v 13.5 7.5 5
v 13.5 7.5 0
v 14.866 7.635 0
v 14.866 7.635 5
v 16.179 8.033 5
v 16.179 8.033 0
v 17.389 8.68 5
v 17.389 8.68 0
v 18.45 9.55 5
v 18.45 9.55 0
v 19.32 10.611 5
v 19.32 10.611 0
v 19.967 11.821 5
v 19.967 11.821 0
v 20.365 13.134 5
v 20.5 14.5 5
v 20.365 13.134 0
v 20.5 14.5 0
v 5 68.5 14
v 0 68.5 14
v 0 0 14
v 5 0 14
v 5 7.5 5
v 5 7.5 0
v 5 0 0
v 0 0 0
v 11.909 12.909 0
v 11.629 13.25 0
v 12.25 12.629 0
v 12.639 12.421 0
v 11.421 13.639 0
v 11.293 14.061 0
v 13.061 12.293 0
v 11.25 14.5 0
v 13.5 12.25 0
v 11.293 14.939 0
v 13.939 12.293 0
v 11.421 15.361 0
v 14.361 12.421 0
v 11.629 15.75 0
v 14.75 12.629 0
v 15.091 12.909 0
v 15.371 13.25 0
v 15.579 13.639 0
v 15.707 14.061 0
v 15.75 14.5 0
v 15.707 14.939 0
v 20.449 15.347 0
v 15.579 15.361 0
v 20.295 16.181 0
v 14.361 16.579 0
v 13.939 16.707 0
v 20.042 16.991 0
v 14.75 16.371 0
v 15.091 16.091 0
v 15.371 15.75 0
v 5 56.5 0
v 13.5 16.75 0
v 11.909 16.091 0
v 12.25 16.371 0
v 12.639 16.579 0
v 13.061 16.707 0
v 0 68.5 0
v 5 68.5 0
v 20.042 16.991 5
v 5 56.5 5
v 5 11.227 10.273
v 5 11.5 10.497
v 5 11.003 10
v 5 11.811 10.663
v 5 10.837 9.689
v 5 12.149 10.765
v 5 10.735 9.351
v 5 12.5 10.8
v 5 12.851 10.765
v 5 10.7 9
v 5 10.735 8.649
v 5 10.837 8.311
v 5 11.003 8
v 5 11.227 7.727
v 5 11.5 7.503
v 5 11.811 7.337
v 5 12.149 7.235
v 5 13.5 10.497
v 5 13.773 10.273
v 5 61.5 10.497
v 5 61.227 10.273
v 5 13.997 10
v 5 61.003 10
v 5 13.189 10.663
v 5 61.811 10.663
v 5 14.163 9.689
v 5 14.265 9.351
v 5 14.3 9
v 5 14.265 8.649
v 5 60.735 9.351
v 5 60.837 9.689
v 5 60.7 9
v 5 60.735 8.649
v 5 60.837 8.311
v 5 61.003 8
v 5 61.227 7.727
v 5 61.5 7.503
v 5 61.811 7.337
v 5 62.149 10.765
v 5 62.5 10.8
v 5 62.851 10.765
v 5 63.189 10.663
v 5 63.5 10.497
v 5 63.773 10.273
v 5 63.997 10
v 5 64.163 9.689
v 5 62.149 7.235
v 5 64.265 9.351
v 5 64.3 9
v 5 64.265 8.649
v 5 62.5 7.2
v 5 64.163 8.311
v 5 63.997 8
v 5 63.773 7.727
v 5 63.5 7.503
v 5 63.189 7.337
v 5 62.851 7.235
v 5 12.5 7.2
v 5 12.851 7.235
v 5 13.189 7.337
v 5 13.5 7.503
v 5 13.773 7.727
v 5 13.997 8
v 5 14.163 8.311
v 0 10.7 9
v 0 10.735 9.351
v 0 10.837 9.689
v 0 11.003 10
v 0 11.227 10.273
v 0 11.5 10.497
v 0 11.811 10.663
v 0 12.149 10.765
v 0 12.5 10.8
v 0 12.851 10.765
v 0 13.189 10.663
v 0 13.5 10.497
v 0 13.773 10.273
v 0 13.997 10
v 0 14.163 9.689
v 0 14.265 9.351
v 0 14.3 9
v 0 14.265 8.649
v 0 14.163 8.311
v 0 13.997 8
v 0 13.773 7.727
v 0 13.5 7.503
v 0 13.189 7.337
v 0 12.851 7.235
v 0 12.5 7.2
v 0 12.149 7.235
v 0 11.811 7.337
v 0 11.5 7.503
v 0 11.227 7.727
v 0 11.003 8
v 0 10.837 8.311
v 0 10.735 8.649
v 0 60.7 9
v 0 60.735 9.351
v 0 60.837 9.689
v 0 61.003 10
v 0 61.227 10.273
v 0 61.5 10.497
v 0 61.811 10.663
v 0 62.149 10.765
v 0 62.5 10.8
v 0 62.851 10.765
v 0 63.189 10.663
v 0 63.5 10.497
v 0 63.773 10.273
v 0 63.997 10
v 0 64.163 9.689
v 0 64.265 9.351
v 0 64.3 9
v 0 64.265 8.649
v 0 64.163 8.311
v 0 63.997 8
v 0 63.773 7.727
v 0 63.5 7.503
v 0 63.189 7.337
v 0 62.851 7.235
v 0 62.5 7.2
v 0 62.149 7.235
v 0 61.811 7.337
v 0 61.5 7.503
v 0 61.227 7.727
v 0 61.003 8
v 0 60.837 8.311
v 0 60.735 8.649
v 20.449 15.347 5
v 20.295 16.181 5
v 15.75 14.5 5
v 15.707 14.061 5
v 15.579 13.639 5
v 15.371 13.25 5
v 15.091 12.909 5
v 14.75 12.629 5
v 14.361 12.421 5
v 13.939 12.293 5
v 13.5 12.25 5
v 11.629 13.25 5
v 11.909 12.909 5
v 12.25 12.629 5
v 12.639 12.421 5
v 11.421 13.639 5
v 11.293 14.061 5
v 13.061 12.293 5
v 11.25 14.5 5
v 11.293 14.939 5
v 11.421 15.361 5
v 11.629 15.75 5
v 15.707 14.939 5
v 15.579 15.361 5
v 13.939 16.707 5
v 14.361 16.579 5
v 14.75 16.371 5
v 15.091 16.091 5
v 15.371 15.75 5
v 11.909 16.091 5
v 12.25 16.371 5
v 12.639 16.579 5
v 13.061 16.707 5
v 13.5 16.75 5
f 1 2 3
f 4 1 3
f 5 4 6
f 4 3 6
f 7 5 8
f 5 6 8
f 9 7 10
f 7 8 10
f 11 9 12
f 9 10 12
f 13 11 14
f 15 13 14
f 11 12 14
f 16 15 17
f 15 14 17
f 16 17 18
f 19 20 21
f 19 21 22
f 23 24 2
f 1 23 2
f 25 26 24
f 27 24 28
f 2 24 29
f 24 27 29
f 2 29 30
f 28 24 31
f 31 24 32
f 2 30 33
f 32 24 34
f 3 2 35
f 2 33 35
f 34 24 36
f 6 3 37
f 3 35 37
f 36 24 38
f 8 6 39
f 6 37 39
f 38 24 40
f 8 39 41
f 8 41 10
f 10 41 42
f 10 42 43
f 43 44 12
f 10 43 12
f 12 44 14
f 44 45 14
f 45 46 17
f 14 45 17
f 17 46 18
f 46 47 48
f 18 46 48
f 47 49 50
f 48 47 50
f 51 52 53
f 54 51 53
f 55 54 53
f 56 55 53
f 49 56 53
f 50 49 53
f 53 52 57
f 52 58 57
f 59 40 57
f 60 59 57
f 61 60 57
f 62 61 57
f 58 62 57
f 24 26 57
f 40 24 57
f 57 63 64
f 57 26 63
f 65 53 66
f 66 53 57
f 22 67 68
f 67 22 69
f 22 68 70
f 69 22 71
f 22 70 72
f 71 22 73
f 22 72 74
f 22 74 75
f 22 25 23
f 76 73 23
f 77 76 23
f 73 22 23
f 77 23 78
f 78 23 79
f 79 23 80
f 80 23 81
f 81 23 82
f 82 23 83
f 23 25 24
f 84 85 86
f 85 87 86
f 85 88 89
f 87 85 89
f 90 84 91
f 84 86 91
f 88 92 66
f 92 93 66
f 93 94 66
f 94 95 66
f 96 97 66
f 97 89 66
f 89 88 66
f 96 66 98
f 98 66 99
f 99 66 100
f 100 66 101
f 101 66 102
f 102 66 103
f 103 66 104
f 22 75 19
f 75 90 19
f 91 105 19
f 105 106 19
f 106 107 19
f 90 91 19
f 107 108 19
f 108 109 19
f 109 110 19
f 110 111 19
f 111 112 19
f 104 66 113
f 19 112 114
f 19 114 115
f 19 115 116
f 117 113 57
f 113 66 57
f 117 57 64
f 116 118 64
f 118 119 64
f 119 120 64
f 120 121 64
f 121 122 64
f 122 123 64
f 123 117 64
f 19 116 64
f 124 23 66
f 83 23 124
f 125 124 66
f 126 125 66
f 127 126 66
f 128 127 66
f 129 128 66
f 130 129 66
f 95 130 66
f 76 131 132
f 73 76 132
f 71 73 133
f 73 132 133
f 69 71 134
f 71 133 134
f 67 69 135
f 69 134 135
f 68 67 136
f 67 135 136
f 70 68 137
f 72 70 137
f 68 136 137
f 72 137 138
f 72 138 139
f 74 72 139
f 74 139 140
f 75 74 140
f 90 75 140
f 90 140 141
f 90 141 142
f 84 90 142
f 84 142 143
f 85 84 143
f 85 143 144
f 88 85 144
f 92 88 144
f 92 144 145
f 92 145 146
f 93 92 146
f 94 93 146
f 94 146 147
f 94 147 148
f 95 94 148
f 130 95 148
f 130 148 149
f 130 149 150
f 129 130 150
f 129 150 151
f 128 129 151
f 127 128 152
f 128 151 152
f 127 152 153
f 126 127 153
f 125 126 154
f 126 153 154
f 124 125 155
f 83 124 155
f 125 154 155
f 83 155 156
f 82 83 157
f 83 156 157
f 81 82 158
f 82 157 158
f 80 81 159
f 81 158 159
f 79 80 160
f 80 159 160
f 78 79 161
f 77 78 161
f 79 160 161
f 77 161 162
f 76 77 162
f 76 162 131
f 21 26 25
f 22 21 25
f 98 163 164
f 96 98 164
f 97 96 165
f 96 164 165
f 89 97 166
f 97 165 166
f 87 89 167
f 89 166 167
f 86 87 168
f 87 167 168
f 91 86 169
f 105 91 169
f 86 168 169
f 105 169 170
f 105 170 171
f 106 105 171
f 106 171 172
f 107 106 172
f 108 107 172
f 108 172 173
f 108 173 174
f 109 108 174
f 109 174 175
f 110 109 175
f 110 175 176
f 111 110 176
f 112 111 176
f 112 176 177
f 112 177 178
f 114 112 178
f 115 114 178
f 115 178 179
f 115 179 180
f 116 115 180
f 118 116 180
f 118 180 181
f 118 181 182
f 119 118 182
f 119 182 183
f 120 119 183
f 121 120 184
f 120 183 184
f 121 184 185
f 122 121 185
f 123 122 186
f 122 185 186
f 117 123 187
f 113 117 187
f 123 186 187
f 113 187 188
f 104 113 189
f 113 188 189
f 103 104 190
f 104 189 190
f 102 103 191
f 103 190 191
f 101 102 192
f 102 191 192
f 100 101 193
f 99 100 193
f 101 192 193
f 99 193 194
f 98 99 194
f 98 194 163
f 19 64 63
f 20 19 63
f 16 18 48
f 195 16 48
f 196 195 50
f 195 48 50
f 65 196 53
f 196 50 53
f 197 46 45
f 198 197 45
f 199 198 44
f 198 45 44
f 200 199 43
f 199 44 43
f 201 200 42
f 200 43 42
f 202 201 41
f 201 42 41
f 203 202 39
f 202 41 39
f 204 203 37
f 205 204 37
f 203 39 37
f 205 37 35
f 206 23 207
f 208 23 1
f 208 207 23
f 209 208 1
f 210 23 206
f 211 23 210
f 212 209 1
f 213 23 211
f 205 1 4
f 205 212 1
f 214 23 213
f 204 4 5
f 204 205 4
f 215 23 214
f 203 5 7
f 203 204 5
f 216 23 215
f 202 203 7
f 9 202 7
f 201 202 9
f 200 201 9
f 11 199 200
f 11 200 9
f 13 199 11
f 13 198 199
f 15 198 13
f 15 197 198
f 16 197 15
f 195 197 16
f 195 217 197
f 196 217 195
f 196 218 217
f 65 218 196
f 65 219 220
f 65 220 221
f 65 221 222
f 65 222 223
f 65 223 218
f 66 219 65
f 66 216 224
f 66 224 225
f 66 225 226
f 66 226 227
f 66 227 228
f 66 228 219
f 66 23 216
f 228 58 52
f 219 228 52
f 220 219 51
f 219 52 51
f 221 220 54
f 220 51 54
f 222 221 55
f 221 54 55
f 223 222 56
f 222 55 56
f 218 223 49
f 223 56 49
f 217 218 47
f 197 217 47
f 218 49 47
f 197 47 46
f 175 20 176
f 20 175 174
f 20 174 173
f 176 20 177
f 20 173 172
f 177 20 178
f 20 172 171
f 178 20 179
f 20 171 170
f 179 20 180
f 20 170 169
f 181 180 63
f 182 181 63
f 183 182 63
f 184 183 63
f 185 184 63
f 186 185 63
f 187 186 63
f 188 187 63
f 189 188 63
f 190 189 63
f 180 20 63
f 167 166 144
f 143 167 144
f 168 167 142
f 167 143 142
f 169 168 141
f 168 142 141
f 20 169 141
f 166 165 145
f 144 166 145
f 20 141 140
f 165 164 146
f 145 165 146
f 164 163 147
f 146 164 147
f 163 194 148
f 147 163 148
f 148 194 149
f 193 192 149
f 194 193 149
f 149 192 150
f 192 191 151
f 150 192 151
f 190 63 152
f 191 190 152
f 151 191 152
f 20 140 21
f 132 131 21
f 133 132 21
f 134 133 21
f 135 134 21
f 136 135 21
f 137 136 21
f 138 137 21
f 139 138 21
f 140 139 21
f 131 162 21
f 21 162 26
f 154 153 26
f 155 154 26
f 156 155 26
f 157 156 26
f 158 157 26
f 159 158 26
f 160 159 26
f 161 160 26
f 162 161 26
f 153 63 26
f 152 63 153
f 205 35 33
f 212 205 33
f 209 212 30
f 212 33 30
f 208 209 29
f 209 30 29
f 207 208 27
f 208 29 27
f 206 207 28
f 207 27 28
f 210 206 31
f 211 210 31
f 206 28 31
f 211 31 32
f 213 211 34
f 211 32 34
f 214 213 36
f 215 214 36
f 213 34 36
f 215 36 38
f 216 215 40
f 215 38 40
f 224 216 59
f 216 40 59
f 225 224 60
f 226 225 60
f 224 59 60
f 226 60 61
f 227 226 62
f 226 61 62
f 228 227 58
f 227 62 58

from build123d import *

# Parameters (mm, degrees)
F1_DEPTH = 14
F2_R     = 1.8
F3_DEPTH = 25
F4_DEPTH = 5


with BuildPart() as f1:
    # F0 (on Top) → F1 (new body)
    with BuildSketch(Plane.XY):
        Polygon((0, 68.5), (0, 0), (5, 0), (5, 7.5), (5, 21.5), (5, 56.5), (5, 68.5), align=None)
    extrude(amount=F1_DEPTH)

    # F2 (on face) → F3 (cut)
    with BuildSketch(Plane(origin=(0, 0, 0), x_dir=(0, -1, 0), z_dir=(-1, 0, 0))):
        with Locations((-62.5, 9)):
            Circle(F2_R)
        with Locations((-12.5, 9)):
            Circle(F2_R)
    extrude(amount=-F3_DEPTH, mode=Mode.SUBTRACT)

    # F0 (on Top) → F4 (join)
    with BuildSketch(Plane.XY):
        with BuildLine():
            Line((5, 56.5), (5, 21.5))
            Line((5, 21.5), (13.5, 21.5))
            ThreePointArc((13.5, 21.5), (17.472758, 20.263436), (20.041924, 16.990628))
            Line((20.041924, 16.990628), (5, 56.5))
        make_face()
        with BuildLine():
            Line((5, 21.5), (5, 7.5))
            Line((5, 7.5), (13.5, 7.5))
            ThreePointArc((13.5, 7.5), (6.5, 14.5), (13.5, 21.5))
            Line((13.5, 21.5), (5, 21.5))
        make_face()
        with BuildLine():
            Line((13.5, 12.25), (13.5, 7.5))
            ThreePointArc((13.5, 7.5), (18.449747, 9.550253), (20.5, 14.5))
            ThreePointArc((20.5, 14.5), (20.384529, 15.766201), (20.041924, 16.990628))
            ThreePointArc((20.041924, 16.990628), (17.472758, 20.263436), (13.5, 21.5))
            Line((13.5, 21.5), (13.5, 16.75))
            ThreePointArc((13.5, 16.75), (15.09099, 16.09099), (15.75, 14.5))
            ThreePointArc((15.75, 14.5), (15.09099, 12.90901), (13.5, 12.25))
        make_face()
        with BuildLine():
            ThreePointArc((13.5, 21.5), (6.5, 14.5), (13.5, 7.5))
            Line((13.5, 7.5), (13.5, 12.25))
            ThreePointArc((13.5, 12.25), (11.25, 14.5), (13.5, 16.75))
            Line((13.5, 16.75), (13.5, 21.5))
        make_face()
    extrude(amount=F4_DEPTH)


solid = f1.part
